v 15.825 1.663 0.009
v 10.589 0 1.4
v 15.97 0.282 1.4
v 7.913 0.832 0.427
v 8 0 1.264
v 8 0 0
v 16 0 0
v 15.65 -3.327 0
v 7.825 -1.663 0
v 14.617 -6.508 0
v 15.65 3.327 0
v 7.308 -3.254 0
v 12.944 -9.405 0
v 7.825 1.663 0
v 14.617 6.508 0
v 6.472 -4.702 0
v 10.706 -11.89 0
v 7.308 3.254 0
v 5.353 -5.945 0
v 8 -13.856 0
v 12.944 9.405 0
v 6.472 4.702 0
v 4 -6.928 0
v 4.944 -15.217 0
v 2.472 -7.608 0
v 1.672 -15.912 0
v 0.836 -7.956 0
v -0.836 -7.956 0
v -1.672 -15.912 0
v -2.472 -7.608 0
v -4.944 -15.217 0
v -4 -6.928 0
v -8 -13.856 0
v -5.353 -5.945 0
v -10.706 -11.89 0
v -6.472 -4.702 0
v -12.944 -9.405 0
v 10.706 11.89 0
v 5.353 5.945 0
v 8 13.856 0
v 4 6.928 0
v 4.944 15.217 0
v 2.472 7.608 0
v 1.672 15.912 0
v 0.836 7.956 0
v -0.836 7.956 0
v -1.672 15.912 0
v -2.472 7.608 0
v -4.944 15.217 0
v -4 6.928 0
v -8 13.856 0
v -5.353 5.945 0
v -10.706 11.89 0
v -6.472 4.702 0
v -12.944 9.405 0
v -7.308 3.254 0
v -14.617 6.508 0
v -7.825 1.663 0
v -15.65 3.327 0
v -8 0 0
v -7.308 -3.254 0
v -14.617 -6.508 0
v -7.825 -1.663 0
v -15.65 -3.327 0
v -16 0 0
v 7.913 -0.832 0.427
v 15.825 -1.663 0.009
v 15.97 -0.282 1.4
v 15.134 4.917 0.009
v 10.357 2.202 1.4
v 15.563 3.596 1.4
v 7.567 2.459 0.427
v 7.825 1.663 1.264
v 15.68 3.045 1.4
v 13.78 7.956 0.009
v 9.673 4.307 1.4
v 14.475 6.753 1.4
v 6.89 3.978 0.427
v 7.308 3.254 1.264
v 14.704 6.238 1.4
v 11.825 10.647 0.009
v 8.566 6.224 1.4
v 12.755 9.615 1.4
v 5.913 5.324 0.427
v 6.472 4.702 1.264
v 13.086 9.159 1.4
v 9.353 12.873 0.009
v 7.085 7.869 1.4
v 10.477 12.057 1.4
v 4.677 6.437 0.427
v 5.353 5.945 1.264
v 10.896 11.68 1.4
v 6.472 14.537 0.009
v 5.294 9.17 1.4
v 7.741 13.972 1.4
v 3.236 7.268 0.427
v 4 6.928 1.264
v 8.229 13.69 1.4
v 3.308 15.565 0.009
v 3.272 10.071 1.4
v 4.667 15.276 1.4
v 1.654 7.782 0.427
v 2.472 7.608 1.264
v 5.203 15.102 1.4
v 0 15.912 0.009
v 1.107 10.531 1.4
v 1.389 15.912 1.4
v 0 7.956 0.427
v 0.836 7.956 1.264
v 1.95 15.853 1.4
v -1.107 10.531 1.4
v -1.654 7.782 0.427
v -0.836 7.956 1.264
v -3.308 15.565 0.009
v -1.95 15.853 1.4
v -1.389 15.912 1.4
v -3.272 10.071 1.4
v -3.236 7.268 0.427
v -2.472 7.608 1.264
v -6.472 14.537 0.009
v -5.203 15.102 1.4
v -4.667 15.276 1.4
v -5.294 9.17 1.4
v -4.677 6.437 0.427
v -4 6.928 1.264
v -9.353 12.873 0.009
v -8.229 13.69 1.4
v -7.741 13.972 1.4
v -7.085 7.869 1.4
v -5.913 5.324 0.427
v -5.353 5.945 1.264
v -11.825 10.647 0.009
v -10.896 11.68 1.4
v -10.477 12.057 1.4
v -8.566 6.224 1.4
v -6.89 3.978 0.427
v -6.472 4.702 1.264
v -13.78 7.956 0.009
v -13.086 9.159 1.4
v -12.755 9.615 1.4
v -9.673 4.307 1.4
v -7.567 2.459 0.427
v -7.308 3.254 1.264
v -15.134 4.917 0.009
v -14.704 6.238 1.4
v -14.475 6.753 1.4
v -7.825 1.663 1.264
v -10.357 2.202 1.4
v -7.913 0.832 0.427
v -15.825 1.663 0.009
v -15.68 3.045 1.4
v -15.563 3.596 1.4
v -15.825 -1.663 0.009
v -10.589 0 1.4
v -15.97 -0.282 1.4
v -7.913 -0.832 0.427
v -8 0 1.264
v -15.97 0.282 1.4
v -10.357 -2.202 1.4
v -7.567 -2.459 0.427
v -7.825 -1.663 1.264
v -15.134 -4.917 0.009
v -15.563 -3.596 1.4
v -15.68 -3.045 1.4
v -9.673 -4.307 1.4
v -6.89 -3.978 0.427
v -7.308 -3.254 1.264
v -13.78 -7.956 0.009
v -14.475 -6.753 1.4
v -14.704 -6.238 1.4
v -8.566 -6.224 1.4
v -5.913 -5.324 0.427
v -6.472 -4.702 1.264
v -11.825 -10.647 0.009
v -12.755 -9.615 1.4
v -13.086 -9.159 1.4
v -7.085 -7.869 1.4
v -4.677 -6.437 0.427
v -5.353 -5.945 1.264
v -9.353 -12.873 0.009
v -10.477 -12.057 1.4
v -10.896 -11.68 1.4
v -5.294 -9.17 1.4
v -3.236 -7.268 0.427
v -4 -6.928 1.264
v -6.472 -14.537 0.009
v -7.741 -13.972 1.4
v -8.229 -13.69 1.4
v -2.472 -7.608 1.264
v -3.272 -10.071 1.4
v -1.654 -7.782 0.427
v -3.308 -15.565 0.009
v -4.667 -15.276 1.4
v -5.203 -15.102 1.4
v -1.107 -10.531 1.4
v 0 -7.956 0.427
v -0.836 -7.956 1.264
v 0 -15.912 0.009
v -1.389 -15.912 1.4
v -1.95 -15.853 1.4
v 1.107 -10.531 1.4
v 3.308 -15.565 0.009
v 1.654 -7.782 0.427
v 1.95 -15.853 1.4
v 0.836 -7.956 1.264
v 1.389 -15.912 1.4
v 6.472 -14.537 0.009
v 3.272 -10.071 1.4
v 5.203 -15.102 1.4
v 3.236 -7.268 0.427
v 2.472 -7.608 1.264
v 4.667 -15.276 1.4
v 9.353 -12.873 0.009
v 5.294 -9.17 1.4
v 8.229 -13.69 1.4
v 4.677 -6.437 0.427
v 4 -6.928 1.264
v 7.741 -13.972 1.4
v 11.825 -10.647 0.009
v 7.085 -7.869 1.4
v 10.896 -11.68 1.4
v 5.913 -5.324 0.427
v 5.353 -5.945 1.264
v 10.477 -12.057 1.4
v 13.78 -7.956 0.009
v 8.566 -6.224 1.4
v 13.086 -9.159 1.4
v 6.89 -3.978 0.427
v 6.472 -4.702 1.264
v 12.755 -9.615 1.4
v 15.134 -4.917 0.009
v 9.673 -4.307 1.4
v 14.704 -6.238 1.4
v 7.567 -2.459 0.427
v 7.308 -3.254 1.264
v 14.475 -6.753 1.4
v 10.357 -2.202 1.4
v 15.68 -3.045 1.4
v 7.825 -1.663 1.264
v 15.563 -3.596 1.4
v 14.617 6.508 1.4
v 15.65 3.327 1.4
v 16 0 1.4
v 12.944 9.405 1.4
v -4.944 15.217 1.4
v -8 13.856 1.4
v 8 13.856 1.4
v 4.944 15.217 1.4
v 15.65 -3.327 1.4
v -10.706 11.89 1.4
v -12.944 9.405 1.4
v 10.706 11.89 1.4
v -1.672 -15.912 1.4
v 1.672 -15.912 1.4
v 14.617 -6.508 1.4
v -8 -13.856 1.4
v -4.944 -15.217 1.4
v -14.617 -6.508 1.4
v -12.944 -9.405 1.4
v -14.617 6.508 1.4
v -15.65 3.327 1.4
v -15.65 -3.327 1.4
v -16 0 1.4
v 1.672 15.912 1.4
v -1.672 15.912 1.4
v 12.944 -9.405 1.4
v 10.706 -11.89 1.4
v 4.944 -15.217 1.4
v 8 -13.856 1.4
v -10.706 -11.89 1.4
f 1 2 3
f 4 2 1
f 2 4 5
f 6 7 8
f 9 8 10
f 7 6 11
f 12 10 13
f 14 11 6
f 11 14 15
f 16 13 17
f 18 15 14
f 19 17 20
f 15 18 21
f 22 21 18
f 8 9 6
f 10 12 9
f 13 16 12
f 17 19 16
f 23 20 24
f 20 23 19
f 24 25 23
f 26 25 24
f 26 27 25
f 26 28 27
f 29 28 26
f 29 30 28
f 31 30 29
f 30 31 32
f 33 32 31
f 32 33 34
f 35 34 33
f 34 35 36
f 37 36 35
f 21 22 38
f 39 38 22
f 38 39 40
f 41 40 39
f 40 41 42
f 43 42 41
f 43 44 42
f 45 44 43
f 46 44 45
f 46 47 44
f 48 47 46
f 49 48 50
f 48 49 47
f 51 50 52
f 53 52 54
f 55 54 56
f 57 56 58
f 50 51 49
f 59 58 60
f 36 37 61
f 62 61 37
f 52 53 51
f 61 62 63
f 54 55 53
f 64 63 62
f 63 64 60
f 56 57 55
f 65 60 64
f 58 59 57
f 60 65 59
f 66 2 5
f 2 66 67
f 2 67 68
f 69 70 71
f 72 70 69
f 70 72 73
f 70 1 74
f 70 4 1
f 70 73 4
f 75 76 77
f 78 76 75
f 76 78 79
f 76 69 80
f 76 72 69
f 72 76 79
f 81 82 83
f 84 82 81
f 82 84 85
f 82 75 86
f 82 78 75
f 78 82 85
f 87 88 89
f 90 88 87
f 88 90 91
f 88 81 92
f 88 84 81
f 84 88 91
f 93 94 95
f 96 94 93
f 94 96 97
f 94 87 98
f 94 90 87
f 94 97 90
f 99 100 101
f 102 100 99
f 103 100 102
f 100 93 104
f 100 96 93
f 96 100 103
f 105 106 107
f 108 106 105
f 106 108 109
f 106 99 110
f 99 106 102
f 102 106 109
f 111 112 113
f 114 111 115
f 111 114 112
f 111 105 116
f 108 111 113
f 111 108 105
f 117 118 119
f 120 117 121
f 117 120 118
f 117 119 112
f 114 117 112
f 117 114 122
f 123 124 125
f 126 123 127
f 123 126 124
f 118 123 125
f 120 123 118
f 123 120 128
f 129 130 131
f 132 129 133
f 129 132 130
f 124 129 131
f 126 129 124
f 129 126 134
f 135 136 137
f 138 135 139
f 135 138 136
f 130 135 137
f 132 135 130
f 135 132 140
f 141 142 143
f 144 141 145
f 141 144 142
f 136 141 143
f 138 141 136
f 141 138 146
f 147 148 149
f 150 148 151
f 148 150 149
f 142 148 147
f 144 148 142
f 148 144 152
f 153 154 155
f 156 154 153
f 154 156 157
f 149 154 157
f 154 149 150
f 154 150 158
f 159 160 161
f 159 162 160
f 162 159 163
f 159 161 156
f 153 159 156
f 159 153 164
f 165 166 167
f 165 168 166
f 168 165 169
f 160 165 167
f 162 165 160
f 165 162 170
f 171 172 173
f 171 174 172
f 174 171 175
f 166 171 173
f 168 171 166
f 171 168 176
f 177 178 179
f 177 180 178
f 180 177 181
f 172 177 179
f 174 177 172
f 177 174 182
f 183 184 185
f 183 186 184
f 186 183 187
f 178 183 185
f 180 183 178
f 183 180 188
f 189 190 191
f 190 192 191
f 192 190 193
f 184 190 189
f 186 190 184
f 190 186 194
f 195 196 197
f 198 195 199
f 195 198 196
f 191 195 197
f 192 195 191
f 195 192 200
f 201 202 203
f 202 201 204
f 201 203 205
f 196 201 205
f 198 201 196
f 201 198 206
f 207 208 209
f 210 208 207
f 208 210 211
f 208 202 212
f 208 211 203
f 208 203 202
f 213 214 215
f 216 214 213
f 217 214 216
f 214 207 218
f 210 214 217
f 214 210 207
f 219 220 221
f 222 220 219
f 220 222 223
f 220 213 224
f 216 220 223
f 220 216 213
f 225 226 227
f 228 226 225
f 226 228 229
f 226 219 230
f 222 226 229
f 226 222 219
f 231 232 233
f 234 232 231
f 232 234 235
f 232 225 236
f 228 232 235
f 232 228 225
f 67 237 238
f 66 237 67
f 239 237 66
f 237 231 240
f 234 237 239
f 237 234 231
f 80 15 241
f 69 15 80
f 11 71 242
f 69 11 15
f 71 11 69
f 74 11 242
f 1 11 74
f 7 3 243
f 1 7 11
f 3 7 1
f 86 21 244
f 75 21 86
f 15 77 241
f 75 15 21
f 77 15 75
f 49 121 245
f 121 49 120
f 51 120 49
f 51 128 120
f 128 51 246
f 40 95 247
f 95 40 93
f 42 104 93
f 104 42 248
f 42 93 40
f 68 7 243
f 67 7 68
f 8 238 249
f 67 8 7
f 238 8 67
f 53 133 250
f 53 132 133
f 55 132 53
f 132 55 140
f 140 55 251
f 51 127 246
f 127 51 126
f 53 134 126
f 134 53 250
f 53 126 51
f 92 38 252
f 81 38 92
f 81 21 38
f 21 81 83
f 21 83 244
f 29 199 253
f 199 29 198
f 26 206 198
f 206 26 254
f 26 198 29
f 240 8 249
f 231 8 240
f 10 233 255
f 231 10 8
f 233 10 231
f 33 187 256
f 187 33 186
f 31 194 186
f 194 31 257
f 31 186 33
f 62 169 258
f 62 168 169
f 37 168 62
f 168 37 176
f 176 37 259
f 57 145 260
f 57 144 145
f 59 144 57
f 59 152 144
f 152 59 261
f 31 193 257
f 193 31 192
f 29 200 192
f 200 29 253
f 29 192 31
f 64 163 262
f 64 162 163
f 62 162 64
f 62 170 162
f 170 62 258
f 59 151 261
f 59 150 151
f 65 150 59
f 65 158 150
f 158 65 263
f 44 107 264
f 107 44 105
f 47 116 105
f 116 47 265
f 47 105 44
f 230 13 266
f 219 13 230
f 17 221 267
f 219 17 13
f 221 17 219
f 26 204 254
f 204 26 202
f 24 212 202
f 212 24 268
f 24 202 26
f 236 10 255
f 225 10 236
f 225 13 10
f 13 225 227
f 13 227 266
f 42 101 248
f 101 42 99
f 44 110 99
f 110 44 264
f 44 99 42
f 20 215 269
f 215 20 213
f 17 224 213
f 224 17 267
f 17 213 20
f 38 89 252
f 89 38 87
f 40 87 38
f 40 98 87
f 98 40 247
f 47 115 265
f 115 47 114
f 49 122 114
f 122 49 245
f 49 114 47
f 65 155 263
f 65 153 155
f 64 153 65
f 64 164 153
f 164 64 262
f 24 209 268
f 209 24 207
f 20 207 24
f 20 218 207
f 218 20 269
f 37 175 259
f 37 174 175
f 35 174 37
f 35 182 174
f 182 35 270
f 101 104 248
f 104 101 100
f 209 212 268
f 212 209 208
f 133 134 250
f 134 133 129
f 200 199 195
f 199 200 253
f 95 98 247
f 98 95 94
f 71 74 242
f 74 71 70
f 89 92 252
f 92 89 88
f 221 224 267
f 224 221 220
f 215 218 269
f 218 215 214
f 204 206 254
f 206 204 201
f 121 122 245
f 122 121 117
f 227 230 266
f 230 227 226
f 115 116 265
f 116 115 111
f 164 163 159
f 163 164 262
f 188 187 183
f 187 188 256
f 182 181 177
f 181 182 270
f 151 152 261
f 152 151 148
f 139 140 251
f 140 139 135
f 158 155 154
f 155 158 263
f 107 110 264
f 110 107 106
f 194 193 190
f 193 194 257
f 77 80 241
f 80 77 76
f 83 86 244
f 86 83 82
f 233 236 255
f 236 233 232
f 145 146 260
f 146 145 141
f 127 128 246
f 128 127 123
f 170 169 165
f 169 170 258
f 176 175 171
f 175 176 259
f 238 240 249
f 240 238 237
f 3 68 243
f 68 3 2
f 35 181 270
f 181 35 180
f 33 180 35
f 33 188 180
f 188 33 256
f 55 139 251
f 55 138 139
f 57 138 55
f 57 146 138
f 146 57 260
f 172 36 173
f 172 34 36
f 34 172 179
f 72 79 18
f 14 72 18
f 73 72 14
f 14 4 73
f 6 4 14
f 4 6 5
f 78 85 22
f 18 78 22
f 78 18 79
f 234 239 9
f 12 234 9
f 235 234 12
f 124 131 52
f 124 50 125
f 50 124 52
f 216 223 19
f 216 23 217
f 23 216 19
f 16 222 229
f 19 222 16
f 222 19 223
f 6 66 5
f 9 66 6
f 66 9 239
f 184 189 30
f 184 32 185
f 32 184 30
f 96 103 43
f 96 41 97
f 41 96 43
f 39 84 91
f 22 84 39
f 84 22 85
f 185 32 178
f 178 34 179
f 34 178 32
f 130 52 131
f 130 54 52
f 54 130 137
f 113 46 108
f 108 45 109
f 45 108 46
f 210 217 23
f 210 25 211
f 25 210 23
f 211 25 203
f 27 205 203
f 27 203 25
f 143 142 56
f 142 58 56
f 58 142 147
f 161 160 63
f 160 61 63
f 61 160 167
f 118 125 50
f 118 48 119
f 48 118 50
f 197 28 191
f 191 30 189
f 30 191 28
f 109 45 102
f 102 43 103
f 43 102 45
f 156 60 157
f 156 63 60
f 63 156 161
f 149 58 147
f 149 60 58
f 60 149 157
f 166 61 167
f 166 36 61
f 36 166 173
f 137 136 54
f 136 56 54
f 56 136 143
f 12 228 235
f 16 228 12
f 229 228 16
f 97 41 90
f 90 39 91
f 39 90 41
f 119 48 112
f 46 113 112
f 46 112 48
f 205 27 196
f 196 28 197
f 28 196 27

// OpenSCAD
//There is a number of parts on Thingiverse called Hirth joint
//The ones implemented not in OpenSCAD I simply ignore, because I don't want to import stl into my models
//Some are completely wrong in their geometry
//Some have non-commercial licence
//Some are nice, but require weird dependencies
//The one that is good, very flexible (maybe too flexible for me) is very unefficient and slows OpenSCAD down a lot
//This is minimalistic module, which is fast and produces correct geometry

id=16;
od=32;
n=30;
w=90;
h=1.4;

function hirth_height(d=32,n=30,w=90)=d*tan(asin(tan(90/n)/tan(w/2)));

module tooth(d=32,n=30,w=90) {
  x=d*cos(180/n)/2;
  y=d*sin(180/n)/2;
  h=d*tan(asin(tan(90/n)/tan(w/2)))/2;
  polyhedron(points=[[0,0,h],
                     [d/2,0,2*h],
                     [x,y,0],
                     [x,-y,0],
                     [0,0,0]],
                     faces=[[0,2,1],[0,1,3],[1,2,3],[0,4,2],[0,3,4],[4,3,2]]);

}
module hirth(d=32,n=30,w=90) {
  for(i=[0:360/n:360-360/n])rotate([0,0,i])tooth(d=d,n=n,w=w);
}

module hirth_limited(od=32,id=16,h=1.4,n=30,w=90) {
  intersection() {
    hirth(d=od/cos(180/n),n=n,w=w);
    if (h!=0) difference() {
      cylinder(h=h!=0?h:hirth_height(od/cos(180/n),n,w),d=od,$fn=n);
      translate([0,0,-0.01])cylinder(h=h+0.02,d=id,$fn=n);
    }
  }
}

hirth_limited(od=od,id=id,h=h,n=n,w=w);

module arri_rosette(thickness=1.5,screw_head_space=1,screw_side_space_diameter=16,bcd=12,n_screws=4,d_center=4,d_circle=2.5) {
  difference() {
    union() {
      translate([0,0,thickness+screw_head_space]) intersection() {
        hirth(d=33,n=60,w=90);
        cylinder(d1=32,d2=32-2*hirth_height(32/cos(180/60),60,90),h=hirth_height(32/cos(180/60),60,90),$fn=60);
        }
      cylinder(h=thickness+screw_head_space,d=32,$fn=60);
    }
    translate([0,0,thickness]) cylinder(d=screw_side_space_diameter,h=screw_head_space+hirth_height(32/cos(180/60),60,90));
    for (i=[0:360/n_screws:360-360/n_screws]) rotate([0,0,i])translate([bcd/2,0,-0.01]) cylinder(h=thickness+0.02,d=d_circle);
    translate([0,0,-0.01]) cylinder(h=thickness+0.02,d=d_center);
  }
}
